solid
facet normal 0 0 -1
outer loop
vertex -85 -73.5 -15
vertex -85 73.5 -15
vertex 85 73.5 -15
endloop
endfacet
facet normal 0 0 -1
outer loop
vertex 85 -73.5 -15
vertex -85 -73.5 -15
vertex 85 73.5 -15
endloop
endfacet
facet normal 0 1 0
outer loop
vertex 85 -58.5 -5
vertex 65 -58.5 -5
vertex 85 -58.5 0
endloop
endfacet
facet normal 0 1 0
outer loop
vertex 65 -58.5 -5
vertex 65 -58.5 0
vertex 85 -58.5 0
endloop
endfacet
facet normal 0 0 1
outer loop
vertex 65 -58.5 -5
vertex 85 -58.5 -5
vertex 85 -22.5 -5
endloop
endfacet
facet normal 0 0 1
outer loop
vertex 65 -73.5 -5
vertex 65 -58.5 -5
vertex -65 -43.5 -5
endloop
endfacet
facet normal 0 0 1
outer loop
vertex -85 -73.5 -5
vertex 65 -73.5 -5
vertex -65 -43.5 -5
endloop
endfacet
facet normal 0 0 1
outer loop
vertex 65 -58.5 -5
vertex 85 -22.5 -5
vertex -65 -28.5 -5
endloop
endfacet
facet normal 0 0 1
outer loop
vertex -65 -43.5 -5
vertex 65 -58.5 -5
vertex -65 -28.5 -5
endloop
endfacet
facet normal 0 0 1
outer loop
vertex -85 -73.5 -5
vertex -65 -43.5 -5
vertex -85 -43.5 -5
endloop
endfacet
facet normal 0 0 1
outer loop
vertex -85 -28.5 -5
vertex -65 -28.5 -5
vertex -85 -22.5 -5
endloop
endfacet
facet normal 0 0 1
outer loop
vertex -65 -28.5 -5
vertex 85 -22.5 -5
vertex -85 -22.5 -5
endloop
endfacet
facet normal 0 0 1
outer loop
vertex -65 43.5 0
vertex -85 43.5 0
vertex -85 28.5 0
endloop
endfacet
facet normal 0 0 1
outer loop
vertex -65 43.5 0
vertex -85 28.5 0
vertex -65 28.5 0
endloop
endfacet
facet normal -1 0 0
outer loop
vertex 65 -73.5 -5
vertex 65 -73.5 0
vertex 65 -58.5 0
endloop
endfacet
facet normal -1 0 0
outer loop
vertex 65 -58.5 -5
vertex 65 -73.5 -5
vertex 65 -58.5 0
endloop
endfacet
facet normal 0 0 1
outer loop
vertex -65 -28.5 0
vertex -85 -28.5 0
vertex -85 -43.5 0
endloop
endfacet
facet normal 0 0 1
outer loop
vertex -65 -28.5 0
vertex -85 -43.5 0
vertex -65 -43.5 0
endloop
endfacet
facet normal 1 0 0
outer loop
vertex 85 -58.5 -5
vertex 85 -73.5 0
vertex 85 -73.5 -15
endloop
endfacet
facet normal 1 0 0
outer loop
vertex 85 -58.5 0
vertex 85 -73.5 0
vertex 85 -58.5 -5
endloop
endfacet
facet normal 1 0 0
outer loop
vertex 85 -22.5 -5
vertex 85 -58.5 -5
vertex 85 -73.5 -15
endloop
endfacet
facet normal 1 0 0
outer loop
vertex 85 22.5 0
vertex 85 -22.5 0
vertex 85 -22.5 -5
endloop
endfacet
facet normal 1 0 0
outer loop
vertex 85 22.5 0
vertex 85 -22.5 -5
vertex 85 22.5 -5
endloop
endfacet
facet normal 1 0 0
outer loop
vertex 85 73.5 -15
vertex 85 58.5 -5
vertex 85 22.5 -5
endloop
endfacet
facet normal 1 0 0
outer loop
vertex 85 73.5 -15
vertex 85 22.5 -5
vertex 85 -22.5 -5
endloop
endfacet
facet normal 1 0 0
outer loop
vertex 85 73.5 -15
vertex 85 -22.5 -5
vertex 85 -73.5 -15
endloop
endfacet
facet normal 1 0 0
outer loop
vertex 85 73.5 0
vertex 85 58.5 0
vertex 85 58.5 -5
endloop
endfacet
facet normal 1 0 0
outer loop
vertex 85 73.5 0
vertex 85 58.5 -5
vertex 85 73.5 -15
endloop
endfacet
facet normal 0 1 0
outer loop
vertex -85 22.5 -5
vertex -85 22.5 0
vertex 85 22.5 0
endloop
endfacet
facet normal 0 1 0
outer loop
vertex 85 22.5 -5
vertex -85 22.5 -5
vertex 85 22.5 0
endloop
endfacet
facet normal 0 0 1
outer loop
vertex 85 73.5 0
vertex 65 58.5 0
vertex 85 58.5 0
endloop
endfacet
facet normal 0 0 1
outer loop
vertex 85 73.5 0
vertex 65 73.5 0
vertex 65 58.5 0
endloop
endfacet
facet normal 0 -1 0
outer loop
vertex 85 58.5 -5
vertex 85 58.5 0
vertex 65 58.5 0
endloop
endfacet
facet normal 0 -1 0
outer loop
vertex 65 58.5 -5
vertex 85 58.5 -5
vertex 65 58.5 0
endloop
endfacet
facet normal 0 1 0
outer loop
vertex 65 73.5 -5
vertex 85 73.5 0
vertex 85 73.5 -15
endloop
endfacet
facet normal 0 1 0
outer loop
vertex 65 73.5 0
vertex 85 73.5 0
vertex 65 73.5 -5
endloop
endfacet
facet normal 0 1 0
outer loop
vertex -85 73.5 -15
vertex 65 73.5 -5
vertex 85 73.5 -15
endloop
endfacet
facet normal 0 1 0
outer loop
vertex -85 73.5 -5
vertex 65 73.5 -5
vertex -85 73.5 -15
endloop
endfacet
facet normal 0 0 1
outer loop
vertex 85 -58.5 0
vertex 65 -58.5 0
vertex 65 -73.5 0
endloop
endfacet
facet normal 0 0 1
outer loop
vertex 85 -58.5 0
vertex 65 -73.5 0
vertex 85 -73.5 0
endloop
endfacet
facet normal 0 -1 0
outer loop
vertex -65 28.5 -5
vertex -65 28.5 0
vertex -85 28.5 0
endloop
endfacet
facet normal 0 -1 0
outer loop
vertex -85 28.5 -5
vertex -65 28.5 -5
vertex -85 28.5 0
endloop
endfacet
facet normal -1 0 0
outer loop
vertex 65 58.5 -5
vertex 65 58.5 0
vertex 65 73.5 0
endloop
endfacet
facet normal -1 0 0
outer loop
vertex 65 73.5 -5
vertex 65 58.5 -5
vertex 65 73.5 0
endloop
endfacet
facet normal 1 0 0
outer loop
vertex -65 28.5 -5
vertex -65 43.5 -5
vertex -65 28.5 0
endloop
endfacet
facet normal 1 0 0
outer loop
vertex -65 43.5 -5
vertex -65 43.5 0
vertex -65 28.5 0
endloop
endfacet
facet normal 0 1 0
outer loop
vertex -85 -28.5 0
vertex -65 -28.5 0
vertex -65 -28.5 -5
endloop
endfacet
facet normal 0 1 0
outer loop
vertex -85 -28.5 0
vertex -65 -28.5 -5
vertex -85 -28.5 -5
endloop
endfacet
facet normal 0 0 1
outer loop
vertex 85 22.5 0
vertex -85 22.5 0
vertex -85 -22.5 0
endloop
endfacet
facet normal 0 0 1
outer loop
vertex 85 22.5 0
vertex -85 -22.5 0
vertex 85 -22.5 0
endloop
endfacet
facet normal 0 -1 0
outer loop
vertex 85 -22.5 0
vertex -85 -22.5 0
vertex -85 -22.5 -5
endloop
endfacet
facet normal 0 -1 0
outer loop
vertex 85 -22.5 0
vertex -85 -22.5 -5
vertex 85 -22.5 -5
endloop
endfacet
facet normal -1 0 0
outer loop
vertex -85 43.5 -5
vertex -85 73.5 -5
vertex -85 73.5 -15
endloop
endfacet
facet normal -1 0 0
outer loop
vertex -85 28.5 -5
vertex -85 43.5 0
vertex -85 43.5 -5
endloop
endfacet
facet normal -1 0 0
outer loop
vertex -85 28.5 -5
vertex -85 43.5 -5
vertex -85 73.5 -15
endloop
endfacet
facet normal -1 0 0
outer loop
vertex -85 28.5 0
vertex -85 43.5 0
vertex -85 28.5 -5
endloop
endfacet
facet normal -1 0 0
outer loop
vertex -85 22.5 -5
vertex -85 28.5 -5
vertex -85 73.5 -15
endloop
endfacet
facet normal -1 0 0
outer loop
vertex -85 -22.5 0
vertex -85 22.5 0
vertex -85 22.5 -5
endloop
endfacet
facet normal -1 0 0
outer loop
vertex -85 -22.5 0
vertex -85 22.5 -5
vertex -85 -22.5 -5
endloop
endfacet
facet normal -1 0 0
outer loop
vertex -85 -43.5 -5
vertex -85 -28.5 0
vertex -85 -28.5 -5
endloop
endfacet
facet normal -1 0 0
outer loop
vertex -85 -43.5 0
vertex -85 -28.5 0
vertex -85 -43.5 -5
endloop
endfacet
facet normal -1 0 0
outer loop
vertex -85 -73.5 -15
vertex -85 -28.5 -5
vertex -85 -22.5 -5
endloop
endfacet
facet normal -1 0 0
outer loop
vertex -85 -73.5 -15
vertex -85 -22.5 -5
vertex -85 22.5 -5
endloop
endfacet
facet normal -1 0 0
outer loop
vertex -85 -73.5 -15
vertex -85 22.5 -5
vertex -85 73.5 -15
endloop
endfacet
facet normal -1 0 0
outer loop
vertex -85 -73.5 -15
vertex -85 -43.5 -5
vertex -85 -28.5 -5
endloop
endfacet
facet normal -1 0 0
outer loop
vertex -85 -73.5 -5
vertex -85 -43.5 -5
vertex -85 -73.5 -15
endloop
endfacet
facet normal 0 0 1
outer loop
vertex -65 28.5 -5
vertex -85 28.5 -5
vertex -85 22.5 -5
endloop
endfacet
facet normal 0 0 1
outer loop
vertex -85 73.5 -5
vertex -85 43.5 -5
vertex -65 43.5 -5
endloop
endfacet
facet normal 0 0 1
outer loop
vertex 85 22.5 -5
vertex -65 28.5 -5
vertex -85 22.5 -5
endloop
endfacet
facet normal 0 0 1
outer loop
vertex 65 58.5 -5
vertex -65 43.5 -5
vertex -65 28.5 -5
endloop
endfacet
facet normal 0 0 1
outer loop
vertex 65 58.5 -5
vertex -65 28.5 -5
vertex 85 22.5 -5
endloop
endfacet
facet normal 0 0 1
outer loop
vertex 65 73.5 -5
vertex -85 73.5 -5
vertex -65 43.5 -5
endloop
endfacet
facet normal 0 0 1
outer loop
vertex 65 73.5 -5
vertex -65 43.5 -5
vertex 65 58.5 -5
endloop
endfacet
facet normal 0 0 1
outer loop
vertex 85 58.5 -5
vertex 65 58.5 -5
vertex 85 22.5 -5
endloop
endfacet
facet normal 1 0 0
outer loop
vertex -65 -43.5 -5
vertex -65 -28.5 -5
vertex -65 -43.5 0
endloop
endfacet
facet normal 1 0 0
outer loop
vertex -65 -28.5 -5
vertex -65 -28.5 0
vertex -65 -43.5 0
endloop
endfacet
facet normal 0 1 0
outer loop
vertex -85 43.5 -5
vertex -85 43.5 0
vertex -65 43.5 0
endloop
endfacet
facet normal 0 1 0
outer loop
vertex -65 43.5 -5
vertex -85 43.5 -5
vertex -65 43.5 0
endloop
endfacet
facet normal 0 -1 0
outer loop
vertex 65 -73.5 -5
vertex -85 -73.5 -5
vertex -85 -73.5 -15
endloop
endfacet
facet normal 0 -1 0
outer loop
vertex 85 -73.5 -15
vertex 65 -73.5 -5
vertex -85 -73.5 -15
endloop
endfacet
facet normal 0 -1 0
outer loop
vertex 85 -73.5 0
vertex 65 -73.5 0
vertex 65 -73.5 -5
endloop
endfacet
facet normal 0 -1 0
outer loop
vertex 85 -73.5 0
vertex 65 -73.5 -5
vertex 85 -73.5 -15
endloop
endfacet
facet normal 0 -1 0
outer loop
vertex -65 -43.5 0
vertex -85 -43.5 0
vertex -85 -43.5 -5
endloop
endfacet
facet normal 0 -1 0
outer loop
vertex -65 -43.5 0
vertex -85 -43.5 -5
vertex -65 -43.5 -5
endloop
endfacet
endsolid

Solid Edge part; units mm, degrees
sketch "Sketch1" plane through (0, 0, 0) normal (0, 0, 1) x (1, 0, 0)
  line L0 (-85, -73.5) -> (85, -73.5)
  line L1 (85, -73.5) -> (85, 73.5)
  line L2 (85, 73.5) -> (-85, 73.5)
  line L3 (-85, 73.5) -> (-85, -73.5)
extrude "Protrusion1" add sketch "Sketch1" against normal blind 15
sketch "Sketch2" plane through (0, 0, 0) normal (0, 0, 1) x (1, 0, 0)
  line L0 (-85, -22.5) -> (85, -22.5)
  line L1 (85, -22.5) -> (85, -28.5)
  line L2 (85, -28.5) -> (-85, -28.5)
  line L3 (-85, -28.5) -> (-85, -22.5)
extrude "ExtrudedCutout_1" cut sketch "Sketch2" against normal blind 5
sketch "Sketch3" plane through (0, 25.5, 0) normal (0, 0, 1) x (1, 0, 0)
  line L0 (-85, -3) -> (85, -3)
  line L1 (85, -3) -> (85, 3)
  line L2 (85, 3) -> (-85, 3)
  line L3 (-85, 3) -> (-85, -3)
extrude "ExtrudedCutout_2" cut sketch "Sketch3" against normal blind 5
sketch "Sketch4" plane through (0, -51, 0) normal (0, 0, 1) x (1, 0, 0)
  line L0 (85, 22.5) -> (-65, 22.5)
  line L1 (-65, 22.5) -> (-65, -22.5)
  line L2 (-65, -22.5) -> (65, -22.5)
  line L3 (65, -22.5) -> (65, -7.5)
  line L4 (65, -7.5) -> (85, -7.5)
  line L5 (85, -7.5) -> (85, 22.5)
extrude "ExtrudedCutout_3" cut sketch "Sketch4" against normal blind 5
sketch "Sketch5" plane through (-75, -51, 0) normal (0, 0, 1) x (1, 0, 0)
  line L0 (-10, 7.5) -> (10, 7.5)
  line L1 (10, 7.5) -> (10, -22.5)
  line L2 (10, -22.5) -> (-10, -22.5)
  line L3 (-10, -22.5) -> (-10, 7.5)
extrude "ExtrudedCutout_4" cut sketch "Sketch5" against normal blind 5
sketch "Sketch6" plane through (0, 51, 0) normal (0, 0, 1) x (1, 0, 0)
  line L0 (-85, 22.5) -> (-85, -7.5)
  line L1 (-85, -7.5) -> (-65, -7.5)
  line L2 (-65, -7.5) -> (-65, -22.5)
  line L3 (-65, -22.5) -> (85, -22.5)
  line L4 (85, -22.5) -> (85, 7.5)
  line L5 (85, 7.5) -> (65, 7.5)
  line L6 (65, 7.5) -> (65, 22.5)
  line L7 (65, 22.5) -> (-85, 22.5)
extrude "ExtrudedCutout_5" cut sketch "Sketch6" against normal blind 5
